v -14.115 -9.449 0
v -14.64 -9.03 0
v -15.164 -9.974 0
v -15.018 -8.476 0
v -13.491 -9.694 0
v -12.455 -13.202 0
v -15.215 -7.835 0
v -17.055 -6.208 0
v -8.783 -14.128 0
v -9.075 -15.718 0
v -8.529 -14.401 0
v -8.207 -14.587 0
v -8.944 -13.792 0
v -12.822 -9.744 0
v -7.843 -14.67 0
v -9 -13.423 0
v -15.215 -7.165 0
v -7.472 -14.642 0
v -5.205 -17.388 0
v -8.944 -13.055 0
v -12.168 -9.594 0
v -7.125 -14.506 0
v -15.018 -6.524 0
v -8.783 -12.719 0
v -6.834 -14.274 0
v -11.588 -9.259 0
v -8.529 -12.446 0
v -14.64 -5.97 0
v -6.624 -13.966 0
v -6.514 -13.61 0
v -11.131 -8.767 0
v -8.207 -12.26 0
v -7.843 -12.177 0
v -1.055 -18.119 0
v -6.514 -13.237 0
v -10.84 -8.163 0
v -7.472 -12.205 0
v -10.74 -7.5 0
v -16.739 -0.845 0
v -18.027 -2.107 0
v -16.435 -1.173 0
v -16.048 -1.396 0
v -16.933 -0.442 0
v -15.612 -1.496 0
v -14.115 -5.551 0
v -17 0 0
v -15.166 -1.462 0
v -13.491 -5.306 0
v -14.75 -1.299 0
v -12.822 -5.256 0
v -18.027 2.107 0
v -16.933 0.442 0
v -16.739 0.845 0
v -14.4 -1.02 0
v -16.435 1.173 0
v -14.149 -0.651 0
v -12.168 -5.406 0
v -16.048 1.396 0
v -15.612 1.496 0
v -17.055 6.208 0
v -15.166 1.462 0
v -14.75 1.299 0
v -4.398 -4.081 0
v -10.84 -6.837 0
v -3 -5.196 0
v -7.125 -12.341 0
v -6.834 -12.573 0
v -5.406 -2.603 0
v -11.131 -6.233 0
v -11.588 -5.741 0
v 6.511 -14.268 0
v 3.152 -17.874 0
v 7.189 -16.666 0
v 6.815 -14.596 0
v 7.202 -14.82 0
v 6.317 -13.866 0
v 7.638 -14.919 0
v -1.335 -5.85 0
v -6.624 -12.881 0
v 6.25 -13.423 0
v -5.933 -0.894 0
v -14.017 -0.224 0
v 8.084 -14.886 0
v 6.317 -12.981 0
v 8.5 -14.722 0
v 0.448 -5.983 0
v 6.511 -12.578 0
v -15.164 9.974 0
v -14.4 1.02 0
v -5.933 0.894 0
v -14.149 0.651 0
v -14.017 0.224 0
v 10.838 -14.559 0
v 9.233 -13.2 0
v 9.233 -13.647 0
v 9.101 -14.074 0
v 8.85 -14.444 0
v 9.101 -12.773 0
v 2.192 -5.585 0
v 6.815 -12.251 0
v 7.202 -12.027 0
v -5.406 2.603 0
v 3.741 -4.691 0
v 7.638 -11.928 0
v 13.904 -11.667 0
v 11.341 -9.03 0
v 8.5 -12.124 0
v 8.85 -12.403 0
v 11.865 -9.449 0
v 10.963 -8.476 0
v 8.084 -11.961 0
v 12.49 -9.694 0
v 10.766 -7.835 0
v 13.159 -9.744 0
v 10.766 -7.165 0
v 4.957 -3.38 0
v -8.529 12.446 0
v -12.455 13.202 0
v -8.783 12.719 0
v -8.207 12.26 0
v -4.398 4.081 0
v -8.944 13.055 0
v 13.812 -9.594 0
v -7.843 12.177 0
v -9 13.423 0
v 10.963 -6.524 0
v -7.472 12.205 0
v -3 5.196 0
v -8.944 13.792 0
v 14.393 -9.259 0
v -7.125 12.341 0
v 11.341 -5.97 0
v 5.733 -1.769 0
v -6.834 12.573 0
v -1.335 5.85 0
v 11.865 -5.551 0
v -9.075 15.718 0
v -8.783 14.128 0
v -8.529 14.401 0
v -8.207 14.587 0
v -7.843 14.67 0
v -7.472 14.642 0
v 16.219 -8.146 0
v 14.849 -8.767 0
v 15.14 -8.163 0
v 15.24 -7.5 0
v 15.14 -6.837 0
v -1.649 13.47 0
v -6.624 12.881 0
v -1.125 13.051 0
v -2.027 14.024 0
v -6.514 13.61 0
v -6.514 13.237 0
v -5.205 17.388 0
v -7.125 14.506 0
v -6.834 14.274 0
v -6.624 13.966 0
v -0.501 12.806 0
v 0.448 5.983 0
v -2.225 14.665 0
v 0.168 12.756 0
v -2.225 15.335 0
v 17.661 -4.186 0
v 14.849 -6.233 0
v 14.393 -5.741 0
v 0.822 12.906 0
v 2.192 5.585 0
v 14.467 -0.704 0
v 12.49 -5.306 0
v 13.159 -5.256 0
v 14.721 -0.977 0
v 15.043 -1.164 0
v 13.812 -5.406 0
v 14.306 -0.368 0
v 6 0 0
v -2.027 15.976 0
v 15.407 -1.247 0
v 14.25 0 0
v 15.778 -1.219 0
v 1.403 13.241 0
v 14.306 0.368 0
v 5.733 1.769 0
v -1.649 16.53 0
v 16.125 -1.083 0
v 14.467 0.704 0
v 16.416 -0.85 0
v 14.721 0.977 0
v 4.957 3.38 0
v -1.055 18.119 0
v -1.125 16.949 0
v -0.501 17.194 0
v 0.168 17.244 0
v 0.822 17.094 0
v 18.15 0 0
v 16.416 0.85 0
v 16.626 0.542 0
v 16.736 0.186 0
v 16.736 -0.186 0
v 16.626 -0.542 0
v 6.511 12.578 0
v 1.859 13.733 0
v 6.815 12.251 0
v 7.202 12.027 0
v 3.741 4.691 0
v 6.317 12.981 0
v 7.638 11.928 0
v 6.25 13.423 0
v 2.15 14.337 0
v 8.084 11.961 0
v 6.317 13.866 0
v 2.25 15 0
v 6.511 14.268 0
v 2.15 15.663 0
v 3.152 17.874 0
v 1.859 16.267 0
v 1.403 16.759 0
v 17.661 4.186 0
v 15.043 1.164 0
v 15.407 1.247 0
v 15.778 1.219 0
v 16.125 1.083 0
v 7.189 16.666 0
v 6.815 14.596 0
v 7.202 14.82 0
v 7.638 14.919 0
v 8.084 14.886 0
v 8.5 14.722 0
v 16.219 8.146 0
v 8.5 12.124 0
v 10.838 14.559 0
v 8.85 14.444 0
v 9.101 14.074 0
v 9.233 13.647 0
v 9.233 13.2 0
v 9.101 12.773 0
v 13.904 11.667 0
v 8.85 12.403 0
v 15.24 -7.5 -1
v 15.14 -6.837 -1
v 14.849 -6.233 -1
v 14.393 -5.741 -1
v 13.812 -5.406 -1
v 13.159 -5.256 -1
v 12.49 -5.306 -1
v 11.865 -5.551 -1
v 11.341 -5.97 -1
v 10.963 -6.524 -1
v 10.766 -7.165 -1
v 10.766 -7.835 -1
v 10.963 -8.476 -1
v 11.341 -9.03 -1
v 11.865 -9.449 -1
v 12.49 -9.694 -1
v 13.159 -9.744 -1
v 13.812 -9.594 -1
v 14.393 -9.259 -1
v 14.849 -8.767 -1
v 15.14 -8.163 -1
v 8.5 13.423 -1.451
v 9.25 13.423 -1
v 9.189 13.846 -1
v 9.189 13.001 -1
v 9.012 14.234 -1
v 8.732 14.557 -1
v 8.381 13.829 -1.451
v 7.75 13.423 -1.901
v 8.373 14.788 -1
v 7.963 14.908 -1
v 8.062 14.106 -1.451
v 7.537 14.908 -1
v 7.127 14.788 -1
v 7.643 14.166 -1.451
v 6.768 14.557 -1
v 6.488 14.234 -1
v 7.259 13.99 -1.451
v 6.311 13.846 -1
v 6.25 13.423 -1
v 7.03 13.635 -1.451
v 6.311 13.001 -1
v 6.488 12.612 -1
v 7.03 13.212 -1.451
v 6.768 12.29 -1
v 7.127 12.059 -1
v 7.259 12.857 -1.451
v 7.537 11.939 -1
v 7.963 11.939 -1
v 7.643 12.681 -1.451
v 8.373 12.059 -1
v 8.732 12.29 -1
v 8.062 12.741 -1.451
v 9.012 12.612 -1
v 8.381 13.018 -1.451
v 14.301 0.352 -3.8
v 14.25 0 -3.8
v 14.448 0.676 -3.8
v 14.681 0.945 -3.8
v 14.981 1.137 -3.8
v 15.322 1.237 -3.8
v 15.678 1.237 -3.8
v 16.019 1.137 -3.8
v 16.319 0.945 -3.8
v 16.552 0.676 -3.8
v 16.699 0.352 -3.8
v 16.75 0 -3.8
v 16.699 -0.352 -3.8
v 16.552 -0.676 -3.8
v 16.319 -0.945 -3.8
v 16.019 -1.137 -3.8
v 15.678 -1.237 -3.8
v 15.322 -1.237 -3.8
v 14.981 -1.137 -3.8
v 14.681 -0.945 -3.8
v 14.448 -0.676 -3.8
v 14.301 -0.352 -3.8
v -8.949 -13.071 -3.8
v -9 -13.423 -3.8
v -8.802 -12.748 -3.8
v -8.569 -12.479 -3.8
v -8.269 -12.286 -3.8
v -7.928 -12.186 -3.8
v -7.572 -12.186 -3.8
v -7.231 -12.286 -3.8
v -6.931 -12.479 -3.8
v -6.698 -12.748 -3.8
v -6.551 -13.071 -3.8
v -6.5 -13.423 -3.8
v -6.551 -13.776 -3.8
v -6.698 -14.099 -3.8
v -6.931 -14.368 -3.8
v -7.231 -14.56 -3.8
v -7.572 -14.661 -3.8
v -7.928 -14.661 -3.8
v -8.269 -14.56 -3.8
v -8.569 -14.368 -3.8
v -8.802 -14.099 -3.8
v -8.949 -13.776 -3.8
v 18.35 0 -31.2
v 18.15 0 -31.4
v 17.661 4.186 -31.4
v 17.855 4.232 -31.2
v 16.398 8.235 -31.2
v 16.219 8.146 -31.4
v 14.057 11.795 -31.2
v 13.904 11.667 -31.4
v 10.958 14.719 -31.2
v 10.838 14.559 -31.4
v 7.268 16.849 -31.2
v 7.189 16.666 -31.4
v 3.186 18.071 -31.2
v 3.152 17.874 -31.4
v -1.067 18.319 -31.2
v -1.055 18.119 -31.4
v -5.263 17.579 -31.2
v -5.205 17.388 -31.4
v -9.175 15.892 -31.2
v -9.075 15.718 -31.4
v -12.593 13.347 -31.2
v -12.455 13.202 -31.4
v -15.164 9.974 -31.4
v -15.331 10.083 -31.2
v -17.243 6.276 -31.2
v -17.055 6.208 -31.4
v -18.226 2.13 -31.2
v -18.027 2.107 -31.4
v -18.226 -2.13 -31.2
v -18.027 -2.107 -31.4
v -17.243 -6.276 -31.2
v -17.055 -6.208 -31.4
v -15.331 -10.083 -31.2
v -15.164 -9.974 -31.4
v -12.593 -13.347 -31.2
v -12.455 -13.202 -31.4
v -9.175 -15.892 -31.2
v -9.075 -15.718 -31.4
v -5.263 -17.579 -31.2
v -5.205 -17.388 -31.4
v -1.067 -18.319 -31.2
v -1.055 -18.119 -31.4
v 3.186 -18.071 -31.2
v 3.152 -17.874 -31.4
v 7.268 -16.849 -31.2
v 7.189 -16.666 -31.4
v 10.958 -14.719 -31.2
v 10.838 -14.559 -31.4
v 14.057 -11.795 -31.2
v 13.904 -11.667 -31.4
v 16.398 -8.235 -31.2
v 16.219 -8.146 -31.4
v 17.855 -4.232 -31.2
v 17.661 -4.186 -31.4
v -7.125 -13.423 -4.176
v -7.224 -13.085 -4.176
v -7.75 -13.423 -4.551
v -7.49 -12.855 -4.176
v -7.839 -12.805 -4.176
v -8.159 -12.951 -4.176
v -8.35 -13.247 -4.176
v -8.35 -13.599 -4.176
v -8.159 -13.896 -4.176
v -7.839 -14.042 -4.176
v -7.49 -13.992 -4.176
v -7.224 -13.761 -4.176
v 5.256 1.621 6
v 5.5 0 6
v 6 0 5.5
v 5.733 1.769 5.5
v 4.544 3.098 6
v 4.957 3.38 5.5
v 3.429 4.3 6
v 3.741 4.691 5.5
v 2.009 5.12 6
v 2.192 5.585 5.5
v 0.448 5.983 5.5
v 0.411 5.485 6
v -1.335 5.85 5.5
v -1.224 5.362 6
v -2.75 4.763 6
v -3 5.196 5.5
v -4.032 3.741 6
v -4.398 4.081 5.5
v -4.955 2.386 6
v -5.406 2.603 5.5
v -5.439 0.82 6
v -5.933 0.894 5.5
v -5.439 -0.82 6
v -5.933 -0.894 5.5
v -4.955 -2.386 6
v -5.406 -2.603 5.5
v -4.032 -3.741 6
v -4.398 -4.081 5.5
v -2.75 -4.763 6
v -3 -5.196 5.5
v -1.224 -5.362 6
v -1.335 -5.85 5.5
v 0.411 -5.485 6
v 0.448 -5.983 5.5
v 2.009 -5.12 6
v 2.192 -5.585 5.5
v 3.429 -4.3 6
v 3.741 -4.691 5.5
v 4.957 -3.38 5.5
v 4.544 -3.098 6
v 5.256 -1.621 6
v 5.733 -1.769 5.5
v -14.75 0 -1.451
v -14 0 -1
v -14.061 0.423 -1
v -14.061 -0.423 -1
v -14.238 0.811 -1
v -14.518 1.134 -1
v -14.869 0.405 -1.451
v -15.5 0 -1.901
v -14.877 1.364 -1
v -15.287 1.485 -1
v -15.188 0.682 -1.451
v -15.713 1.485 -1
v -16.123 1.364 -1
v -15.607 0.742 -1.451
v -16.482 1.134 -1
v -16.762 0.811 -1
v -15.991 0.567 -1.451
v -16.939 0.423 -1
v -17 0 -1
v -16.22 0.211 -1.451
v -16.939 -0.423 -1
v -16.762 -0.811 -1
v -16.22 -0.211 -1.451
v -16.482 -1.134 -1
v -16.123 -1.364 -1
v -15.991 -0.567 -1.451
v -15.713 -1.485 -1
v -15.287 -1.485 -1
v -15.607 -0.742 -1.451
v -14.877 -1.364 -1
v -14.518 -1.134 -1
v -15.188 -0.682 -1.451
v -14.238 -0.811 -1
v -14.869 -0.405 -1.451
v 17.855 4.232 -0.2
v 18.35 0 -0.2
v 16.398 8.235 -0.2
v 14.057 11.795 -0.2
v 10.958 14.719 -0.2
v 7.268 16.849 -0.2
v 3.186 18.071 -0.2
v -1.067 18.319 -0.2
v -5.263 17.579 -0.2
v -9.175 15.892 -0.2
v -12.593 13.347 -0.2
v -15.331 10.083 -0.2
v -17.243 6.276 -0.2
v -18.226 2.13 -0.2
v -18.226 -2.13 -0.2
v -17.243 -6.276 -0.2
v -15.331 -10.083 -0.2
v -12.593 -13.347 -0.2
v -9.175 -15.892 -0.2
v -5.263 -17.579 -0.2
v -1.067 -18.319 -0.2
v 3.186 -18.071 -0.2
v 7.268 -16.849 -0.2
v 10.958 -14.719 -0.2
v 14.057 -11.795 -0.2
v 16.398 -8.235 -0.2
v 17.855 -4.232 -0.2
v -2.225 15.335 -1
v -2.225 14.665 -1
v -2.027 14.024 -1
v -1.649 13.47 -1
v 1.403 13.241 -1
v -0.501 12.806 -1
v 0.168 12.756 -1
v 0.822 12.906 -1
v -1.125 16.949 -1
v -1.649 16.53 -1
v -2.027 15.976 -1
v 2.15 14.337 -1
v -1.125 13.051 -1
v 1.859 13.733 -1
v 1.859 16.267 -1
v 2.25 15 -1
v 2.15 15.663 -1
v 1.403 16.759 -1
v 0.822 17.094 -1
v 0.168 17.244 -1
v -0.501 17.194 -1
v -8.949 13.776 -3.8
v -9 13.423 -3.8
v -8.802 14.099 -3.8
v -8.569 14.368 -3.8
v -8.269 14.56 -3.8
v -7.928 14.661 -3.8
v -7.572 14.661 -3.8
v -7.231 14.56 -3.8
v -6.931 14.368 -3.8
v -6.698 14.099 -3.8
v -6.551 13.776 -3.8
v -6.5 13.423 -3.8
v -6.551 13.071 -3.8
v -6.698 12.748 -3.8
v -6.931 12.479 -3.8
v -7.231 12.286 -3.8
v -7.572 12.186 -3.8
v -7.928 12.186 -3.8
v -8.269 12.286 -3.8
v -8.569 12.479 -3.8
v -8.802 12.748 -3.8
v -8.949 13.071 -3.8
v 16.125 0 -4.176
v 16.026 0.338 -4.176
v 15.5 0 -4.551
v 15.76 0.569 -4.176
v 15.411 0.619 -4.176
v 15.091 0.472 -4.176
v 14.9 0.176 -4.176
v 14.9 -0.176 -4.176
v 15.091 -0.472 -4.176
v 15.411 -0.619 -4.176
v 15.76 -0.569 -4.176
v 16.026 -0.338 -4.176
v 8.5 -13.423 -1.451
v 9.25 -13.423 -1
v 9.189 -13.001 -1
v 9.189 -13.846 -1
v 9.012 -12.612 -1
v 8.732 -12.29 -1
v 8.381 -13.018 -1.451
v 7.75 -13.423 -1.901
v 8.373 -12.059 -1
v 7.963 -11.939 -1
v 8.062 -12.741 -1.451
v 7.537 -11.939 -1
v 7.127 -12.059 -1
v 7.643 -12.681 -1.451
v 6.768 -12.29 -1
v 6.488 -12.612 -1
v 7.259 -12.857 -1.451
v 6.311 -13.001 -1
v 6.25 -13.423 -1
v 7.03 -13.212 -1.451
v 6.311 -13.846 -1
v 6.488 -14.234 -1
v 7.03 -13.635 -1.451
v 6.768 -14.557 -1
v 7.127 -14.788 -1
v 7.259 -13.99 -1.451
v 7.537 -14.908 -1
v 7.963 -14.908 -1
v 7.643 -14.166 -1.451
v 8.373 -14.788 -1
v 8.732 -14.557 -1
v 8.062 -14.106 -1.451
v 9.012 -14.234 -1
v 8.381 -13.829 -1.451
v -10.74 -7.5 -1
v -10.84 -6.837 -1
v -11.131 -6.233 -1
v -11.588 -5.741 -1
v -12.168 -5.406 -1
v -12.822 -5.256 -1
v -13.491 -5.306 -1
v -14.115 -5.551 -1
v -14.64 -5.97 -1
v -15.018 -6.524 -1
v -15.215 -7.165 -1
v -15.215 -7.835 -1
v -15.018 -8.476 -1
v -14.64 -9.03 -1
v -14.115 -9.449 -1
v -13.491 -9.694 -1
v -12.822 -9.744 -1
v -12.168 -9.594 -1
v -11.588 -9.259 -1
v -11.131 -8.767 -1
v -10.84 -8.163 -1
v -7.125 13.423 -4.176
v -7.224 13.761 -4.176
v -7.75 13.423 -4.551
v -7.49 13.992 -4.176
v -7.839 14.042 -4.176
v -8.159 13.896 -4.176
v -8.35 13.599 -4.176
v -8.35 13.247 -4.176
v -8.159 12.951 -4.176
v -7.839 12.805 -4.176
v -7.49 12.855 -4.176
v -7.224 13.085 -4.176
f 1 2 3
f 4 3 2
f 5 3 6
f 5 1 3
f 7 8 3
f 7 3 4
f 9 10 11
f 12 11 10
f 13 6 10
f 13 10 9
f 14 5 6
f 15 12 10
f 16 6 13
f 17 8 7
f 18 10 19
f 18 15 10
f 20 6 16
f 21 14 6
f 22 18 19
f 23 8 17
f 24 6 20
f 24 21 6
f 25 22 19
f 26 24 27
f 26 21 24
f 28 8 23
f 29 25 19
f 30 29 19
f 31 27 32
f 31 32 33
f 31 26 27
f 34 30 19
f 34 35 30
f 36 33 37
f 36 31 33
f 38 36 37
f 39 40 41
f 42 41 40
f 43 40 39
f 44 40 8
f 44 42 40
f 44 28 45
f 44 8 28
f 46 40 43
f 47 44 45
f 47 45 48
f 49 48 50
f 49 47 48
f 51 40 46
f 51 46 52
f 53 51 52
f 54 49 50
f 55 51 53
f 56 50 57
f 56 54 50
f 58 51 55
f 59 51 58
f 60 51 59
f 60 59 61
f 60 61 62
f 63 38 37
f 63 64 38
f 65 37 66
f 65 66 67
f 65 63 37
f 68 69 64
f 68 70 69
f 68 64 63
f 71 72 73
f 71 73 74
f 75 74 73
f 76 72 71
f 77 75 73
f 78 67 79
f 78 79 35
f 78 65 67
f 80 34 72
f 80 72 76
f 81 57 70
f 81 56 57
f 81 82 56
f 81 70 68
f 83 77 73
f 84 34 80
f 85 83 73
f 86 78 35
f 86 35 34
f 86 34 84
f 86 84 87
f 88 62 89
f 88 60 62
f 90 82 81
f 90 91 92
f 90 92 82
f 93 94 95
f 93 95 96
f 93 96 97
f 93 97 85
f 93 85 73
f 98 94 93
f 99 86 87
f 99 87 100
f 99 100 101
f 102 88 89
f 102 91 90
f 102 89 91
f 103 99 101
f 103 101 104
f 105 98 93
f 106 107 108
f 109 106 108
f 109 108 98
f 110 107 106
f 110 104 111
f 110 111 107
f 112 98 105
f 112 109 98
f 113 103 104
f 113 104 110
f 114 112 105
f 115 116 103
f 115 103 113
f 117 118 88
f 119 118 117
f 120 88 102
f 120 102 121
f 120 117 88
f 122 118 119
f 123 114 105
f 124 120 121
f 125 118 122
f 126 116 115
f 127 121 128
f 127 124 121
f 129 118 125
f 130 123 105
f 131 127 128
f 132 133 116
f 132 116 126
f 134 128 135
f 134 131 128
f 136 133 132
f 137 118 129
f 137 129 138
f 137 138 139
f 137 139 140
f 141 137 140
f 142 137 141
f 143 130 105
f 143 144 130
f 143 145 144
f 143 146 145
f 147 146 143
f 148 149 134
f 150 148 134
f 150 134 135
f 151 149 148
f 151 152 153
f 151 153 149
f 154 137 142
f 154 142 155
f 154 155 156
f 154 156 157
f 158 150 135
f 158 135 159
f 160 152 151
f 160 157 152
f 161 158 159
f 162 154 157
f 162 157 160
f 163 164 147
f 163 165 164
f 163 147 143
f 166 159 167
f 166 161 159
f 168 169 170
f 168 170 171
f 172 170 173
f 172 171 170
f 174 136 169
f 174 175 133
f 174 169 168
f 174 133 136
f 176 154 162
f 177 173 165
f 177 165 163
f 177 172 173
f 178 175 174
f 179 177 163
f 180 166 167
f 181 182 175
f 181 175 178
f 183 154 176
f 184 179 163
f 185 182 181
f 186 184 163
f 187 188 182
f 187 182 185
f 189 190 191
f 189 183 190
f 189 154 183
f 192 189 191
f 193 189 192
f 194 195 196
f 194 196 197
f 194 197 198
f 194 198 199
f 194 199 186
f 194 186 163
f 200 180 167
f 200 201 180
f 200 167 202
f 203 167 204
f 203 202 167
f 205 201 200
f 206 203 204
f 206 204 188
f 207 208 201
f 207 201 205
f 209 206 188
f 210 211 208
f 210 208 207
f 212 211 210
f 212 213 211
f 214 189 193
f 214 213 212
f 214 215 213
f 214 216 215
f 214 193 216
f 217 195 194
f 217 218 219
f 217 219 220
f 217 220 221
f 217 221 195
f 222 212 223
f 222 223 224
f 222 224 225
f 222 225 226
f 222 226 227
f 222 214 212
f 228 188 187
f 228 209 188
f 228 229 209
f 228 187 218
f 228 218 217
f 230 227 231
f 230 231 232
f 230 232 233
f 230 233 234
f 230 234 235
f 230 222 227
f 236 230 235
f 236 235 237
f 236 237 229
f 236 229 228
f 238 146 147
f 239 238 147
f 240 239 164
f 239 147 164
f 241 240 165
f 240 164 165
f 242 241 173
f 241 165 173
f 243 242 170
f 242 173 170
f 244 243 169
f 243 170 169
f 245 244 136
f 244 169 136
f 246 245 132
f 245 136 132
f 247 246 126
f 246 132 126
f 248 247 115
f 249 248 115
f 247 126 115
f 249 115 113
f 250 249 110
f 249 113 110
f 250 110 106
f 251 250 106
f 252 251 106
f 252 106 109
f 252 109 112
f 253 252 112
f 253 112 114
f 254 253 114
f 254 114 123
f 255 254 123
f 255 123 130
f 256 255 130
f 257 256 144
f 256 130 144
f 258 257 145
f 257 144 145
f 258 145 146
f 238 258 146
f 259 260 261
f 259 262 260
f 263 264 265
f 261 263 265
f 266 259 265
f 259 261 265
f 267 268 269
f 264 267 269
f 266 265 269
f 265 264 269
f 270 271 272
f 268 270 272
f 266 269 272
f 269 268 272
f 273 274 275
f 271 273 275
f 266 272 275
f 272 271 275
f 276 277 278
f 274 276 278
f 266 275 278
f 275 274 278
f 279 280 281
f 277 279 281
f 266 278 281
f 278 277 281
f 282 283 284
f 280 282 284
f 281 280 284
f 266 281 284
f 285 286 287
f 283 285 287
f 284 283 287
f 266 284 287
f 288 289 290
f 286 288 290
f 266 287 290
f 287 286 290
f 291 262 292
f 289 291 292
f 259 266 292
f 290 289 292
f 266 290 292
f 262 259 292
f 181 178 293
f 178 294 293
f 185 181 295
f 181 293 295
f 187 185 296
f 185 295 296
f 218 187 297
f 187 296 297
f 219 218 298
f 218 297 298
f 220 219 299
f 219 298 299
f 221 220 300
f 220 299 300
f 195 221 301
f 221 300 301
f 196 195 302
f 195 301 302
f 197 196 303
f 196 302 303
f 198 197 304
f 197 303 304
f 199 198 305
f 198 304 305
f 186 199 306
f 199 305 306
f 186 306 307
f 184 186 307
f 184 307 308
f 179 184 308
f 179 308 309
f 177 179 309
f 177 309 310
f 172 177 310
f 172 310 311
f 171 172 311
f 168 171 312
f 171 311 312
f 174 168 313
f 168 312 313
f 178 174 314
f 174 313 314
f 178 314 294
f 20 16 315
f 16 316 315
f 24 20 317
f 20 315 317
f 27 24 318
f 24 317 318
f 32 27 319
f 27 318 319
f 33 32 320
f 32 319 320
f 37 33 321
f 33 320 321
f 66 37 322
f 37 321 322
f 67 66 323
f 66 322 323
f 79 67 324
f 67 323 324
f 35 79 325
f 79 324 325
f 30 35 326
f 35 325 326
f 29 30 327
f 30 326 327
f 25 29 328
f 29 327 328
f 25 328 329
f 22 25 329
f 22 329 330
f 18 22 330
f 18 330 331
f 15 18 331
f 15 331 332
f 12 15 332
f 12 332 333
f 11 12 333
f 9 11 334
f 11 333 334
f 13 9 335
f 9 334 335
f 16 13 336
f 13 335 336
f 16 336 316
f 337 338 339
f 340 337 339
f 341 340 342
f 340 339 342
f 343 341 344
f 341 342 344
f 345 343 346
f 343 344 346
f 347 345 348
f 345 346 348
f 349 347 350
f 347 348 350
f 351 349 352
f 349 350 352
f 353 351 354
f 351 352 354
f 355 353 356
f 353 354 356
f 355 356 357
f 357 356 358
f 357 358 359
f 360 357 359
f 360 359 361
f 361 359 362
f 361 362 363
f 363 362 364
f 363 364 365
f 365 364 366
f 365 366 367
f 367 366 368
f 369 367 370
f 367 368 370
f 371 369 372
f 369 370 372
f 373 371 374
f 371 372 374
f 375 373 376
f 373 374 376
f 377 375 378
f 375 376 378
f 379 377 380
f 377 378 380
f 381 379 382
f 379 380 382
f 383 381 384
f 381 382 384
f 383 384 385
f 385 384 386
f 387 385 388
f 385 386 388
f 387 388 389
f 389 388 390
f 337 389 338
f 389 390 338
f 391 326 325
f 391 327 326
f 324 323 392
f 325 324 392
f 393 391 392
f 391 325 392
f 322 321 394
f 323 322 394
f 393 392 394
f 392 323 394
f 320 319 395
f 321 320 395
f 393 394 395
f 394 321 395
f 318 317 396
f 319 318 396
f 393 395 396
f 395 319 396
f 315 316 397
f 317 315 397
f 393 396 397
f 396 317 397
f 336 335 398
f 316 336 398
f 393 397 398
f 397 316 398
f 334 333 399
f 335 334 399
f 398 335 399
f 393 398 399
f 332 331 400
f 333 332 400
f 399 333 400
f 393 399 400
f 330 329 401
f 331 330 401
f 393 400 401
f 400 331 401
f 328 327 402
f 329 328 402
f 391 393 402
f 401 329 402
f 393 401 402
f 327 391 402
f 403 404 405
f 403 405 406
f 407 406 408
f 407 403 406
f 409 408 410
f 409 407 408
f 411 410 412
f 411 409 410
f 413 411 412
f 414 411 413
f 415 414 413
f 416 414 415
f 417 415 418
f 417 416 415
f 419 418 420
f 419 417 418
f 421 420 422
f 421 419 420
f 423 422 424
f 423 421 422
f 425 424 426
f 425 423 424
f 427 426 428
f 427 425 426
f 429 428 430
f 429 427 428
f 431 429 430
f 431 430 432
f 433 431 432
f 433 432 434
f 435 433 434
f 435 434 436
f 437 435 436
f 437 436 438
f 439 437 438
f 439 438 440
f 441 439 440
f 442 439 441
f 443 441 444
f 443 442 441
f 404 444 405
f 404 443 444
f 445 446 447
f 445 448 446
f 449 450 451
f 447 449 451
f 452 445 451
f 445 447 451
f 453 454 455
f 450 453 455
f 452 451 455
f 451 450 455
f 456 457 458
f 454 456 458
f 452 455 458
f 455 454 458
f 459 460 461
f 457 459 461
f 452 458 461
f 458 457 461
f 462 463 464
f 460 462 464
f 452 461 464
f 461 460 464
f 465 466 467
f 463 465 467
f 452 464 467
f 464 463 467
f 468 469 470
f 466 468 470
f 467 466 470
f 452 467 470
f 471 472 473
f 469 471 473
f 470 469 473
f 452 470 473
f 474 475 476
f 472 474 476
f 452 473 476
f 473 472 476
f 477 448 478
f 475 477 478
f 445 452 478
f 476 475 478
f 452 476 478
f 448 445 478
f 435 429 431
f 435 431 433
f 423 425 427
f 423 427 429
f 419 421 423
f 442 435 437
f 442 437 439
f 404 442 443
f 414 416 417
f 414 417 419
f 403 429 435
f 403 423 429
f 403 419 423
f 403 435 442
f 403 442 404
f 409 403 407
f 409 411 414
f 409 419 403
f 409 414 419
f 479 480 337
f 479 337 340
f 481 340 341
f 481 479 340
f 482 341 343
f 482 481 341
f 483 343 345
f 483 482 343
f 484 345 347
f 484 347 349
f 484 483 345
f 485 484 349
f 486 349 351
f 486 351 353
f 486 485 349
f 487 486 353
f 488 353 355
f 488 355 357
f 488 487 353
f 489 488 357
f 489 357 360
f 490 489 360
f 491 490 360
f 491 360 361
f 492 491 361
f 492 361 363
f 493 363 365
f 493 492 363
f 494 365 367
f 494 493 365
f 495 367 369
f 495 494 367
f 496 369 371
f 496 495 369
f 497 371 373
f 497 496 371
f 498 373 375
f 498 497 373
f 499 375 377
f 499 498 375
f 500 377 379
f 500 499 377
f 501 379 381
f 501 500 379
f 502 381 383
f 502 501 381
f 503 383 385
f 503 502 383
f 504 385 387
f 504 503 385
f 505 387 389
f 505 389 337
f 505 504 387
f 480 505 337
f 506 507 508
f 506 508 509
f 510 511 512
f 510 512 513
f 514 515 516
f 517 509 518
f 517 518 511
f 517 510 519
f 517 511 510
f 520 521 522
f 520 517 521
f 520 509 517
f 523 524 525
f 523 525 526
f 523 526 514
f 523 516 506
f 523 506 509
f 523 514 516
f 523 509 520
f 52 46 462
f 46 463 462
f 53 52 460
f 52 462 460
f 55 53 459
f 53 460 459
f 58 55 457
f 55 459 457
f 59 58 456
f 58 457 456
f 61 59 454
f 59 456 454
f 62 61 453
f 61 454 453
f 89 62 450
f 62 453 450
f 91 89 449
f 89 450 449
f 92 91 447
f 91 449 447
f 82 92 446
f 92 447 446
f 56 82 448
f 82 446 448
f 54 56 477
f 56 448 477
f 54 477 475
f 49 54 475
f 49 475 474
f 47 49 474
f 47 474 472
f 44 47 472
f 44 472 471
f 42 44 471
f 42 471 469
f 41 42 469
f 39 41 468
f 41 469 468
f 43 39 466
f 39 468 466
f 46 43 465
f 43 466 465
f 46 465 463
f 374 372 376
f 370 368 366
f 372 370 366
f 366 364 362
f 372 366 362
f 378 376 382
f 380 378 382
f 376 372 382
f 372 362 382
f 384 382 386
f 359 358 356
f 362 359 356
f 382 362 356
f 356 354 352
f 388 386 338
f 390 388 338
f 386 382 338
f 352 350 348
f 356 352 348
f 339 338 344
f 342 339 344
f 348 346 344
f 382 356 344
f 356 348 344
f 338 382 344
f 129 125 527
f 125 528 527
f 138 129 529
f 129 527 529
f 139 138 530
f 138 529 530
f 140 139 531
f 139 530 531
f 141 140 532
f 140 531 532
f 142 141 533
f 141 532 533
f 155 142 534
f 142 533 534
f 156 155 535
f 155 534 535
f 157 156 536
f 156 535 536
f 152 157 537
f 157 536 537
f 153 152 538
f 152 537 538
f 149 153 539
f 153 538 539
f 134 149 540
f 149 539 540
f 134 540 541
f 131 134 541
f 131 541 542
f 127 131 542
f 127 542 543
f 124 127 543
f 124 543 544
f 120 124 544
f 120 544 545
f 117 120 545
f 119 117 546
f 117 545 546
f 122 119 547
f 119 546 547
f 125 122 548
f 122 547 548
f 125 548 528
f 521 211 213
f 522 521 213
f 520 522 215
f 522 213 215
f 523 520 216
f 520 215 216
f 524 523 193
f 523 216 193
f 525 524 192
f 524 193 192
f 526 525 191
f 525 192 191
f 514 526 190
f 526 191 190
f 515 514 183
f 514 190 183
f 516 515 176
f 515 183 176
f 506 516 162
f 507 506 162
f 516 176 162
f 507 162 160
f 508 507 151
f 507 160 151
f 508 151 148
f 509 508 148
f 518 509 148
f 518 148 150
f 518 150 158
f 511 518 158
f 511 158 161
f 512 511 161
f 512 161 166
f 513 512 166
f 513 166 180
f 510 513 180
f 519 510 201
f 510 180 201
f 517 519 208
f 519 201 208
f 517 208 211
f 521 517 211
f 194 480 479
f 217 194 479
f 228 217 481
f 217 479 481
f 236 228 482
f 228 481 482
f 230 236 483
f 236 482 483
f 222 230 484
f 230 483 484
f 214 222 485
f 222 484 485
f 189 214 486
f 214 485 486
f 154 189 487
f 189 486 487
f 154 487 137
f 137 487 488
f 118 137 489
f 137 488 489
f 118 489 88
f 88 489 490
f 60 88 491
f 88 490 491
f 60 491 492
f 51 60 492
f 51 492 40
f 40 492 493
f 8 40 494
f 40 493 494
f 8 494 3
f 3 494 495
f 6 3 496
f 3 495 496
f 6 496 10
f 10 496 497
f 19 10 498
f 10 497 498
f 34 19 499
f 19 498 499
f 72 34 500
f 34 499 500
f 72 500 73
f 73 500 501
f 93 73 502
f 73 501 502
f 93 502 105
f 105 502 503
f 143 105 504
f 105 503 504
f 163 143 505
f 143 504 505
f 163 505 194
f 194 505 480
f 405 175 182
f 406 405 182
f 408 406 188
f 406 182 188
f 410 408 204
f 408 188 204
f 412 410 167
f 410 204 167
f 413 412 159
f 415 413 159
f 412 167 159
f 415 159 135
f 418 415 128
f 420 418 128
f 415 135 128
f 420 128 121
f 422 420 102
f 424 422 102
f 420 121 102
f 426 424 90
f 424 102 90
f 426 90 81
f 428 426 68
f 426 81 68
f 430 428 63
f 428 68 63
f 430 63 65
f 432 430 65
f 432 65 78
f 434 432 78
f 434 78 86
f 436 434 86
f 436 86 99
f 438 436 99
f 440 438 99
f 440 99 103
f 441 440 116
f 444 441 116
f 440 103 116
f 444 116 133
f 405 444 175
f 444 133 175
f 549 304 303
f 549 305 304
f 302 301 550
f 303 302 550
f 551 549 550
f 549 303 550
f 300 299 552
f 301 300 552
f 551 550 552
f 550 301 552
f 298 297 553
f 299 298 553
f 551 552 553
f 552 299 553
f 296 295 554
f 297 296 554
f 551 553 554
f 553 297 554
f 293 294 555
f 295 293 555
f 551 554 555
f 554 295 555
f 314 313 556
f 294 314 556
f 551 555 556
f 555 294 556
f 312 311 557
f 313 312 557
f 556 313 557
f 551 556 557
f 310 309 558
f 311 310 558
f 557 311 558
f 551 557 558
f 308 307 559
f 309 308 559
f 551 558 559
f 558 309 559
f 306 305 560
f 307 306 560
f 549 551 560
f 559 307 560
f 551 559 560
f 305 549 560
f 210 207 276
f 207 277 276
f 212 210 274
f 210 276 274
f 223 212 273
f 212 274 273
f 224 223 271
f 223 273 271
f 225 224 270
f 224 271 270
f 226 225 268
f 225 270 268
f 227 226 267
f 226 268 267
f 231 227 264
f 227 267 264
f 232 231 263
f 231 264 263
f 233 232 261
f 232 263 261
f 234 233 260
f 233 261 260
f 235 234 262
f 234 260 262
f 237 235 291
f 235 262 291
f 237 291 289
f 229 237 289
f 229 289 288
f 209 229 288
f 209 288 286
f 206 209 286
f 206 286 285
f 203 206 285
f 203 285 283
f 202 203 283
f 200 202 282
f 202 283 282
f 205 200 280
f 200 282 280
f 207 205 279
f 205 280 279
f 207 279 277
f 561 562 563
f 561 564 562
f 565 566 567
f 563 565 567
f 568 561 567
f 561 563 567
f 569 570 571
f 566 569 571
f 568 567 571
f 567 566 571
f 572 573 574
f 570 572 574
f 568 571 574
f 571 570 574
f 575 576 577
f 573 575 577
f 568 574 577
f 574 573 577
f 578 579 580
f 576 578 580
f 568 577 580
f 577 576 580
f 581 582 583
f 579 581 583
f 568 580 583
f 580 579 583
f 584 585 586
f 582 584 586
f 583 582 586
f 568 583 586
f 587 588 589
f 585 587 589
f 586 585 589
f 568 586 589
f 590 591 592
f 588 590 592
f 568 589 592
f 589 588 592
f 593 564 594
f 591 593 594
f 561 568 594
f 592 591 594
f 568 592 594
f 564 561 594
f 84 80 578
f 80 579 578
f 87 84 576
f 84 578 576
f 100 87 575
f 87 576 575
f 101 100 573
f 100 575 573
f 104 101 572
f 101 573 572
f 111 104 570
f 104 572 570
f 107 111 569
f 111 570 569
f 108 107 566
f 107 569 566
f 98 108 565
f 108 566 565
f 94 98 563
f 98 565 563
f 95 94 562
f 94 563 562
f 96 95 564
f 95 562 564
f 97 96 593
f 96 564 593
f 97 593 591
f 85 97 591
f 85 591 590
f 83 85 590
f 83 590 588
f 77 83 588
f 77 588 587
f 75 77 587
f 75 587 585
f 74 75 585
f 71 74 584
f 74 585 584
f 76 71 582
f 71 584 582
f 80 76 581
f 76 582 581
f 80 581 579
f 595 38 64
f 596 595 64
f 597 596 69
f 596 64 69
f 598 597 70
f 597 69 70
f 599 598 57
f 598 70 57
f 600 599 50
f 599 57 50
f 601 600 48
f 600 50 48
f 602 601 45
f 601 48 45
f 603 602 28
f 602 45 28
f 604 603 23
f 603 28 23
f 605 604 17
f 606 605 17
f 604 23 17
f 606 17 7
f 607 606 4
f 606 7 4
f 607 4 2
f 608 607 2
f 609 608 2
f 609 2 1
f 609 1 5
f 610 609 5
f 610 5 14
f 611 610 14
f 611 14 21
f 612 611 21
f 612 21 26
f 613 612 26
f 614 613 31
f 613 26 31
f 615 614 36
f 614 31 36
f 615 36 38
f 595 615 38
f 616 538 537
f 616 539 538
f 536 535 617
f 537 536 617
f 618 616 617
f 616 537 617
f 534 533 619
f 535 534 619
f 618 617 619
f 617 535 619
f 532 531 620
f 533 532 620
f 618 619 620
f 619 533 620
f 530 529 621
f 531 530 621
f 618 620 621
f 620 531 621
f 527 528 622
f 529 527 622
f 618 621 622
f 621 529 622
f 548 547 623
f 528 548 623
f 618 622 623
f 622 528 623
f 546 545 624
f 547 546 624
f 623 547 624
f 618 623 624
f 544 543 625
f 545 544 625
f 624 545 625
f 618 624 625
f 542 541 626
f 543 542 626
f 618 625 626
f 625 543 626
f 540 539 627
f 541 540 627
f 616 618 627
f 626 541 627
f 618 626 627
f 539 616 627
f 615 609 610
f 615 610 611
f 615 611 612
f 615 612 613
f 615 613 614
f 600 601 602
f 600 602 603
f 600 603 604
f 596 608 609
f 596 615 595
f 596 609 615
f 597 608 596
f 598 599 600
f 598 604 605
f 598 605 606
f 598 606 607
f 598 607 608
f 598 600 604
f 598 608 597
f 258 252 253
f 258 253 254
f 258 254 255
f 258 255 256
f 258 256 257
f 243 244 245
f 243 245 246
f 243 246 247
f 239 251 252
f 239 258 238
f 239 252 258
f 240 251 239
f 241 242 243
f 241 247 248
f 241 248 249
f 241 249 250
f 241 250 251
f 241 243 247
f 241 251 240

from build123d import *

# Parameters (mm, degrees)
F0_R      = 18.35
F1_DEPTH  = 31.4
F2_R      = 6
F3_DEPTH  = 6
F4_SIZE   = 0.5
F5_SIZE   = 0.2
F6_R      = 2.25
F7_DEPTH  = 1
F9_D      = 3
F9_DEPTH  = 1
F9_TIP    = 0.9012909285
F11_D     = 2.5
F11_DEPTH = 3.8
F11_TIP   = 0.7510757738


with BuildPart() as f1:
    # F0 (on Top) → F1 (new body)
    with BuildSketch(Plane.XY):
        Circle(F0_R)
    extrude(amount=-F1_DEPTH)

    # F2 (on Top) → F3 (join)
    with BuildSketch(Plane.XY):
        Circle(F2_R)
    extrude(amount=F3_DEPTH)

    # F4
    f4_edges = [f1.edges().sort_by_distance(p)[0] for p in [
        (-6, 0, 6),
    ]]
    chamfer(f4_edges, length=F4_SIZE)

    # F5
    f5_edges = [f1.edges().sort_by_distance(p)[0] for p in [
        (-18.35, 0, 0),
        (-18.35, 0, -31.4),
    ]]
    chamfer(f5_edges, length=F5_SIZE)

    # F6 (on Top) → F7 (cut)
    with BuildSketch(Plane.XY):
        with Locations((0, 15)):
            Circle(F6_R)
        with Locations((-12.9903810568, -7.5)):
            Circle(F6_R)
        with Locations((12.9903810568, -7.5)):
            Circle(F6_R)
    extrude(amount=-F7_DEPTH, mode=Mode.SUBTRACT)

    # F9
    with Locations(Plane.XY):
        with Locations((7.75, 13.4233937587), (7.75, -13.4233937587), (-15.5, 0)):
            Hole(F9_D / 2, depth=F9_DEPTH)
            with Locations((0, 0, -(F9_DEPTH + F9_TIP / 2))):  # 118° drill point
                Cone(0, F9_D / 2, F9_TIP, mode=Mode.SUBTRACT)

    # F11
    with Locations(Plane.XY):
        with Locations((-7.75, 13.4233937587), (15.5, 0), (-7.75, -13.4233937587)):
            Hole(F11_D / 2, depth=F11_DEPTH)
            with Locations((0, 0, -(F11_DEPTH + F11_TIP / 2))):  # 118° drill point
                Cone(0, F11_D / 2, F11_TIP, mode=Mode.SUBTRACT)


solid = f1.part
